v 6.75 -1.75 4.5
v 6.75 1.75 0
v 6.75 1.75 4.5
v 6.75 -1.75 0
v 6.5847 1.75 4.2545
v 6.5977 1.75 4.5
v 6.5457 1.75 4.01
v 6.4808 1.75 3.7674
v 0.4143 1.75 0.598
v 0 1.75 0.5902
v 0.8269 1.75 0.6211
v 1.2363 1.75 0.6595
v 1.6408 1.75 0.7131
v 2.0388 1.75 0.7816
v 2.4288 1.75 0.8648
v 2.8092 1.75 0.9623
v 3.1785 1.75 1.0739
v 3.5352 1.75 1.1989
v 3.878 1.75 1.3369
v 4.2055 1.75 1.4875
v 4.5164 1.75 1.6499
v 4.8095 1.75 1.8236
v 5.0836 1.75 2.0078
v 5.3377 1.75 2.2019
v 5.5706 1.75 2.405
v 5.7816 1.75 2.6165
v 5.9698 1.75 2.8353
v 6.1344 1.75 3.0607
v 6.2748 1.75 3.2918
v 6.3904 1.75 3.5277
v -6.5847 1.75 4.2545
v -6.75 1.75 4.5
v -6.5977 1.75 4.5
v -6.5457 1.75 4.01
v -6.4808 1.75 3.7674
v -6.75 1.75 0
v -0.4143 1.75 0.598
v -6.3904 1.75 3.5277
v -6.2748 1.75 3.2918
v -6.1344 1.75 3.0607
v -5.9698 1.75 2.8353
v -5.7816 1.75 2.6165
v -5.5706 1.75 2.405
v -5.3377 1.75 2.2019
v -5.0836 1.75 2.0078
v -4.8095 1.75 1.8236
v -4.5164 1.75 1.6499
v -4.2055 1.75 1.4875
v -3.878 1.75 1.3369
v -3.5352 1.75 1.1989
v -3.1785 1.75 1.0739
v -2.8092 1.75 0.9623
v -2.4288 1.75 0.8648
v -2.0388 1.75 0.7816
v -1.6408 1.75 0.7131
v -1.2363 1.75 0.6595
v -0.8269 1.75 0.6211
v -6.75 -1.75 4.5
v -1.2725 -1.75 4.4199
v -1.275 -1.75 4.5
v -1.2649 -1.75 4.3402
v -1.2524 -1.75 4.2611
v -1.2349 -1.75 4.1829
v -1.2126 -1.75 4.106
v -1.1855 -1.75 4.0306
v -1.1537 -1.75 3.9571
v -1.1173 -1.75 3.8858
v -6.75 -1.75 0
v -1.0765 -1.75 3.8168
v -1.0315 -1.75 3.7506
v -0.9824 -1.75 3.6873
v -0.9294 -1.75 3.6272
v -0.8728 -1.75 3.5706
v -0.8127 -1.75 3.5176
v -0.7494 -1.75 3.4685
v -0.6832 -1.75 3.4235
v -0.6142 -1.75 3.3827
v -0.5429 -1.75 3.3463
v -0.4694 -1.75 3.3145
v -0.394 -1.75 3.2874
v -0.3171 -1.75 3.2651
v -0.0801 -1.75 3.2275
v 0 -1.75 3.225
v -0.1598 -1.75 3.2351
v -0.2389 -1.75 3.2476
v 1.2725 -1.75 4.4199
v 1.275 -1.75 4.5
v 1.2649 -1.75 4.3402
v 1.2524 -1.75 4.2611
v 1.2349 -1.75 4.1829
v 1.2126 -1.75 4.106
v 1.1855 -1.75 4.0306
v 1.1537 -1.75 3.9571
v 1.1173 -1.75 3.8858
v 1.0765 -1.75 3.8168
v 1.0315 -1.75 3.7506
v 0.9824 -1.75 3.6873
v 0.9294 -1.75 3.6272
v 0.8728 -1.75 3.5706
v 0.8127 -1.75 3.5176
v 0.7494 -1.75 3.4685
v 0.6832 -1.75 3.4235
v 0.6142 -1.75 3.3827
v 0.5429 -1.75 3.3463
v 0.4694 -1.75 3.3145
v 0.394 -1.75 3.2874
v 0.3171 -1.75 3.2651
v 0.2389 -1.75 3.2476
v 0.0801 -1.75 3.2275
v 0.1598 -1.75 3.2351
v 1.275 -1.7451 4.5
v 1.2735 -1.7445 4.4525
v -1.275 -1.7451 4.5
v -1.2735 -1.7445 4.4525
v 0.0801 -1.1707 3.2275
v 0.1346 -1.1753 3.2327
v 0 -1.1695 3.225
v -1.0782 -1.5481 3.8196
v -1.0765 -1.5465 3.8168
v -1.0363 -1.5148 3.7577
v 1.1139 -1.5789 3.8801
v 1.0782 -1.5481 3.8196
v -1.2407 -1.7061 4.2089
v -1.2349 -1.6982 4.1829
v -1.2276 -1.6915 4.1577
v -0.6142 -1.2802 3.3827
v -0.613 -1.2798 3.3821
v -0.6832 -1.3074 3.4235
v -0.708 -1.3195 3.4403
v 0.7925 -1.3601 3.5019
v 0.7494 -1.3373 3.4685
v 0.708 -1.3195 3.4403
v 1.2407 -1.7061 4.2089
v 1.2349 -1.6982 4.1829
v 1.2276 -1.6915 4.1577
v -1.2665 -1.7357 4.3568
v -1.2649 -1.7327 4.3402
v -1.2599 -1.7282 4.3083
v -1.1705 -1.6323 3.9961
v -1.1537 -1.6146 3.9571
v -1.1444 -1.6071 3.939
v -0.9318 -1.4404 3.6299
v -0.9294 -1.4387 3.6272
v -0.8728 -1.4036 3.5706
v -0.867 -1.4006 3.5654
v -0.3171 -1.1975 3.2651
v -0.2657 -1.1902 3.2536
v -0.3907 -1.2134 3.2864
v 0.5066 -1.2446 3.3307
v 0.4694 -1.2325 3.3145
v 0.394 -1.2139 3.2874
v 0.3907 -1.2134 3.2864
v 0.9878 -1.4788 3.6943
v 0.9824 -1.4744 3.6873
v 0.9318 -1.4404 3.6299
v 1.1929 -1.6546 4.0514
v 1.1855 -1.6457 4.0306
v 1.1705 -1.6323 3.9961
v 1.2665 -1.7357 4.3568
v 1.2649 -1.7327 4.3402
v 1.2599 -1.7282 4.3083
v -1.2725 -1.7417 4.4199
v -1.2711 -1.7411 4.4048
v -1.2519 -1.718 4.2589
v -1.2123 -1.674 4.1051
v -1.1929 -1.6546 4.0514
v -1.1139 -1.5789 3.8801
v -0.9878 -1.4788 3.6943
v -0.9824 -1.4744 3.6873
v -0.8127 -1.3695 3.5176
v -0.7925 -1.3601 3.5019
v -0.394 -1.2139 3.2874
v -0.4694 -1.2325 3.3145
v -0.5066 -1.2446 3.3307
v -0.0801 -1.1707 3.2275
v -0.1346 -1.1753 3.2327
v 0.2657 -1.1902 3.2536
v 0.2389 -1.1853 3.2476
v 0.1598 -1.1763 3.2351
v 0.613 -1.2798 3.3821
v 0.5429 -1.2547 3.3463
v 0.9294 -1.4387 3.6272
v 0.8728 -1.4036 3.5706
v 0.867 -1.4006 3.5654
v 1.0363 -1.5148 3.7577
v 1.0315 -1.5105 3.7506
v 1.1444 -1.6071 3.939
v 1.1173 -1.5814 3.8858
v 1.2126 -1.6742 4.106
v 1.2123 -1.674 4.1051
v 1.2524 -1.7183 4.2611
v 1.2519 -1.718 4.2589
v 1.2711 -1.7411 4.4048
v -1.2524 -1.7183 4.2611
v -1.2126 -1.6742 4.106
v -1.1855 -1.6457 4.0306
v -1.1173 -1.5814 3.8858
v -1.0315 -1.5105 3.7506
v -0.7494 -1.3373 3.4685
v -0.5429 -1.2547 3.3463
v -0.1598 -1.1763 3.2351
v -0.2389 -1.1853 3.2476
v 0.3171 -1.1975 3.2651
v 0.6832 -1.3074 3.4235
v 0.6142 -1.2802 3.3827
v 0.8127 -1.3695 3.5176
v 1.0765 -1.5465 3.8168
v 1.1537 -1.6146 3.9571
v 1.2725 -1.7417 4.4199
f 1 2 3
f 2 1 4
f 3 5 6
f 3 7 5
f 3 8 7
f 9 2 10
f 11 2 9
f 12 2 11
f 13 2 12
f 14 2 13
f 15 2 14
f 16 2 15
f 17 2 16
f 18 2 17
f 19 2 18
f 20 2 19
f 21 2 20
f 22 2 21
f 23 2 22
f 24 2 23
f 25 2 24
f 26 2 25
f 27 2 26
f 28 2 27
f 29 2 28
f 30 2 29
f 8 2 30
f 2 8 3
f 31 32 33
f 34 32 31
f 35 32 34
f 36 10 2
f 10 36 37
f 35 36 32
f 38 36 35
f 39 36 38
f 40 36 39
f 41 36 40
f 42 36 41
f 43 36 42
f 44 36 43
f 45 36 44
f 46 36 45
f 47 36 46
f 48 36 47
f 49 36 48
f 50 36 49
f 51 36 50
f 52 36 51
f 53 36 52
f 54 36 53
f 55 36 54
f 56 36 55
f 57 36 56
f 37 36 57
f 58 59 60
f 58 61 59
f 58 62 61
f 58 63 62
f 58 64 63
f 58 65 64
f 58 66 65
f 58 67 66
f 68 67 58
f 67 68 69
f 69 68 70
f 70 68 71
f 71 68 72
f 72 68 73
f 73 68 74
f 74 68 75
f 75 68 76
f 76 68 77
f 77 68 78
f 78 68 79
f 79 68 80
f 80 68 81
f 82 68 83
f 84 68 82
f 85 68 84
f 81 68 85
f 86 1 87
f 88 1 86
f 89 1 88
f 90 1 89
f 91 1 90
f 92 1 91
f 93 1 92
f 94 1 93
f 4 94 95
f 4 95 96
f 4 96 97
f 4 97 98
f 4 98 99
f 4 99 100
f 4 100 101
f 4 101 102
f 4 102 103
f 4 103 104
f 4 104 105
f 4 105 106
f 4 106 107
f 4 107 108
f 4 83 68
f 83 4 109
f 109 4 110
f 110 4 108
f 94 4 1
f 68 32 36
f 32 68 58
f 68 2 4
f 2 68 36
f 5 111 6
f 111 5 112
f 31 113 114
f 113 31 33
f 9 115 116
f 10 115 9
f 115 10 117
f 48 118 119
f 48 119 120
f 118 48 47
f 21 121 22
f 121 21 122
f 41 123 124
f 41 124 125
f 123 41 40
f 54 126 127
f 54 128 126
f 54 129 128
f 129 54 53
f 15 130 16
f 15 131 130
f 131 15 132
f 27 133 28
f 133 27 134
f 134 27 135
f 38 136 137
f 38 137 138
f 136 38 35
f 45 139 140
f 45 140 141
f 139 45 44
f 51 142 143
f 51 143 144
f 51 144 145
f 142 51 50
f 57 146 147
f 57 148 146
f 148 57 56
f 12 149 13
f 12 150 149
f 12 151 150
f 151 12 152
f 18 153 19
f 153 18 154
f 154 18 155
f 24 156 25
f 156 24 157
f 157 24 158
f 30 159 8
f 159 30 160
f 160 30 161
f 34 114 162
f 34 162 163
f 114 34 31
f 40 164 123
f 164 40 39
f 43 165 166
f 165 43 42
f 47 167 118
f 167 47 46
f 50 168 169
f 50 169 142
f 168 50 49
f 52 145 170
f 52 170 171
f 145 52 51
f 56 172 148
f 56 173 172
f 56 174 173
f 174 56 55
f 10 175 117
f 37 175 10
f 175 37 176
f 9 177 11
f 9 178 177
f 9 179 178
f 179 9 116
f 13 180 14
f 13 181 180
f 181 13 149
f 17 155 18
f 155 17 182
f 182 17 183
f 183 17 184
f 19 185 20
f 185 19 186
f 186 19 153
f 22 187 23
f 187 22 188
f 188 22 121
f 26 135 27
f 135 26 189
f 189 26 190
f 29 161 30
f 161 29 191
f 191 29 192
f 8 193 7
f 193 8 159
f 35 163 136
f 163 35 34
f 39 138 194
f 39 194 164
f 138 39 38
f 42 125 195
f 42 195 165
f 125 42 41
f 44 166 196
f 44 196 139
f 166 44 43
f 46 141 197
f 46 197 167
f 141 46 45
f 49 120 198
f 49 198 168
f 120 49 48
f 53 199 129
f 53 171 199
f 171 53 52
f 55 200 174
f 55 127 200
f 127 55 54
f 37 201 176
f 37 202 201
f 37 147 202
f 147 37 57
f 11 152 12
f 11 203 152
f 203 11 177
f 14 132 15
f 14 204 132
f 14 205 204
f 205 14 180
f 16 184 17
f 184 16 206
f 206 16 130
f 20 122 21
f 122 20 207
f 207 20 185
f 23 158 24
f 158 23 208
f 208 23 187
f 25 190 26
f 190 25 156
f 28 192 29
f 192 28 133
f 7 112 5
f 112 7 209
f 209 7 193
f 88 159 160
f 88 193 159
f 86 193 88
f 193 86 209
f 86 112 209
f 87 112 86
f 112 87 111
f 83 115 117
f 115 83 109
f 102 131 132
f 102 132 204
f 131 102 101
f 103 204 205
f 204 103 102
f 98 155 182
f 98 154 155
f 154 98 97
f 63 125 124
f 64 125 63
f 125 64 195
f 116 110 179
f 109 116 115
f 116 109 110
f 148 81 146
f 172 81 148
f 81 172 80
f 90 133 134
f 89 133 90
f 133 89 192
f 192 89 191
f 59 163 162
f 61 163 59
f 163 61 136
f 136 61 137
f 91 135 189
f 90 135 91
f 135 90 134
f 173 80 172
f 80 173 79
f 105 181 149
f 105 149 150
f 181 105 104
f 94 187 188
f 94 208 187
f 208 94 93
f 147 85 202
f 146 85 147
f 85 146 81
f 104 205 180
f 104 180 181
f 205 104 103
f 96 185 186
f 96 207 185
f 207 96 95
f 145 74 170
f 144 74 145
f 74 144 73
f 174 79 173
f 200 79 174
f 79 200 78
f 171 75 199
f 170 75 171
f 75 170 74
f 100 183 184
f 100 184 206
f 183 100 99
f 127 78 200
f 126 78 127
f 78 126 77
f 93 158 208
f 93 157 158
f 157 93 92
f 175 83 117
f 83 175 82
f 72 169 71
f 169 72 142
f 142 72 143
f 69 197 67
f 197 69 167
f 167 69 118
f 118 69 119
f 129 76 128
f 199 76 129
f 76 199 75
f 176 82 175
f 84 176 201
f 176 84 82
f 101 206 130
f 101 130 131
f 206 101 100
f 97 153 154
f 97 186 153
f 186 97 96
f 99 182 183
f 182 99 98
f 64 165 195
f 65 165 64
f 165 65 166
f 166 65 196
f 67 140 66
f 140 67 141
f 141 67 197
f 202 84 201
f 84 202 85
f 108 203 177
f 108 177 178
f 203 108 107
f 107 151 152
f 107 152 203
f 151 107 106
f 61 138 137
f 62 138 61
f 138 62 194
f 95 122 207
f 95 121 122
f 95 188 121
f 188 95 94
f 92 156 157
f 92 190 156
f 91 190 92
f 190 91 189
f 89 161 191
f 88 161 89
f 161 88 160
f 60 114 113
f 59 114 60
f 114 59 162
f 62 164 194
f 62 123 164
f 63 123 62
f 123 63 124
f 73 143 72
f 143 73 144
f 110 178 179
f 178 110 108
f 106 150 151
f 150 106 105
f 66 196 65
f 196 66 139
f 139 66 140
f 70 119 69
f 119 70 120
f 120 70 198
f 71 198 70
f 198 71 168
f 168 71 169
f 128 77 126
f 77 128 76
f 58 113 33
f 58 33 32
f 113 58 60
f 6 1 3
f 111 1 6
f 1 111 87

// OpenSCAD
include <RemoteControlModules.scad>

// Diode cone block width
dcbw = 13.5;
// Diode cone block length
dcbl = 9;
// Diode cone block height
dcbh = 3.5;
// Diode diameter
dcdr = 5.1;
// Outer radius
dcor = 4;

//diode_cone_block(dcbw, dcbl, dcbh, dcdr/2, dcor);
diode_cone_block_half(dcbw, dcbl, dcbh, dcdr/2, dcor);
